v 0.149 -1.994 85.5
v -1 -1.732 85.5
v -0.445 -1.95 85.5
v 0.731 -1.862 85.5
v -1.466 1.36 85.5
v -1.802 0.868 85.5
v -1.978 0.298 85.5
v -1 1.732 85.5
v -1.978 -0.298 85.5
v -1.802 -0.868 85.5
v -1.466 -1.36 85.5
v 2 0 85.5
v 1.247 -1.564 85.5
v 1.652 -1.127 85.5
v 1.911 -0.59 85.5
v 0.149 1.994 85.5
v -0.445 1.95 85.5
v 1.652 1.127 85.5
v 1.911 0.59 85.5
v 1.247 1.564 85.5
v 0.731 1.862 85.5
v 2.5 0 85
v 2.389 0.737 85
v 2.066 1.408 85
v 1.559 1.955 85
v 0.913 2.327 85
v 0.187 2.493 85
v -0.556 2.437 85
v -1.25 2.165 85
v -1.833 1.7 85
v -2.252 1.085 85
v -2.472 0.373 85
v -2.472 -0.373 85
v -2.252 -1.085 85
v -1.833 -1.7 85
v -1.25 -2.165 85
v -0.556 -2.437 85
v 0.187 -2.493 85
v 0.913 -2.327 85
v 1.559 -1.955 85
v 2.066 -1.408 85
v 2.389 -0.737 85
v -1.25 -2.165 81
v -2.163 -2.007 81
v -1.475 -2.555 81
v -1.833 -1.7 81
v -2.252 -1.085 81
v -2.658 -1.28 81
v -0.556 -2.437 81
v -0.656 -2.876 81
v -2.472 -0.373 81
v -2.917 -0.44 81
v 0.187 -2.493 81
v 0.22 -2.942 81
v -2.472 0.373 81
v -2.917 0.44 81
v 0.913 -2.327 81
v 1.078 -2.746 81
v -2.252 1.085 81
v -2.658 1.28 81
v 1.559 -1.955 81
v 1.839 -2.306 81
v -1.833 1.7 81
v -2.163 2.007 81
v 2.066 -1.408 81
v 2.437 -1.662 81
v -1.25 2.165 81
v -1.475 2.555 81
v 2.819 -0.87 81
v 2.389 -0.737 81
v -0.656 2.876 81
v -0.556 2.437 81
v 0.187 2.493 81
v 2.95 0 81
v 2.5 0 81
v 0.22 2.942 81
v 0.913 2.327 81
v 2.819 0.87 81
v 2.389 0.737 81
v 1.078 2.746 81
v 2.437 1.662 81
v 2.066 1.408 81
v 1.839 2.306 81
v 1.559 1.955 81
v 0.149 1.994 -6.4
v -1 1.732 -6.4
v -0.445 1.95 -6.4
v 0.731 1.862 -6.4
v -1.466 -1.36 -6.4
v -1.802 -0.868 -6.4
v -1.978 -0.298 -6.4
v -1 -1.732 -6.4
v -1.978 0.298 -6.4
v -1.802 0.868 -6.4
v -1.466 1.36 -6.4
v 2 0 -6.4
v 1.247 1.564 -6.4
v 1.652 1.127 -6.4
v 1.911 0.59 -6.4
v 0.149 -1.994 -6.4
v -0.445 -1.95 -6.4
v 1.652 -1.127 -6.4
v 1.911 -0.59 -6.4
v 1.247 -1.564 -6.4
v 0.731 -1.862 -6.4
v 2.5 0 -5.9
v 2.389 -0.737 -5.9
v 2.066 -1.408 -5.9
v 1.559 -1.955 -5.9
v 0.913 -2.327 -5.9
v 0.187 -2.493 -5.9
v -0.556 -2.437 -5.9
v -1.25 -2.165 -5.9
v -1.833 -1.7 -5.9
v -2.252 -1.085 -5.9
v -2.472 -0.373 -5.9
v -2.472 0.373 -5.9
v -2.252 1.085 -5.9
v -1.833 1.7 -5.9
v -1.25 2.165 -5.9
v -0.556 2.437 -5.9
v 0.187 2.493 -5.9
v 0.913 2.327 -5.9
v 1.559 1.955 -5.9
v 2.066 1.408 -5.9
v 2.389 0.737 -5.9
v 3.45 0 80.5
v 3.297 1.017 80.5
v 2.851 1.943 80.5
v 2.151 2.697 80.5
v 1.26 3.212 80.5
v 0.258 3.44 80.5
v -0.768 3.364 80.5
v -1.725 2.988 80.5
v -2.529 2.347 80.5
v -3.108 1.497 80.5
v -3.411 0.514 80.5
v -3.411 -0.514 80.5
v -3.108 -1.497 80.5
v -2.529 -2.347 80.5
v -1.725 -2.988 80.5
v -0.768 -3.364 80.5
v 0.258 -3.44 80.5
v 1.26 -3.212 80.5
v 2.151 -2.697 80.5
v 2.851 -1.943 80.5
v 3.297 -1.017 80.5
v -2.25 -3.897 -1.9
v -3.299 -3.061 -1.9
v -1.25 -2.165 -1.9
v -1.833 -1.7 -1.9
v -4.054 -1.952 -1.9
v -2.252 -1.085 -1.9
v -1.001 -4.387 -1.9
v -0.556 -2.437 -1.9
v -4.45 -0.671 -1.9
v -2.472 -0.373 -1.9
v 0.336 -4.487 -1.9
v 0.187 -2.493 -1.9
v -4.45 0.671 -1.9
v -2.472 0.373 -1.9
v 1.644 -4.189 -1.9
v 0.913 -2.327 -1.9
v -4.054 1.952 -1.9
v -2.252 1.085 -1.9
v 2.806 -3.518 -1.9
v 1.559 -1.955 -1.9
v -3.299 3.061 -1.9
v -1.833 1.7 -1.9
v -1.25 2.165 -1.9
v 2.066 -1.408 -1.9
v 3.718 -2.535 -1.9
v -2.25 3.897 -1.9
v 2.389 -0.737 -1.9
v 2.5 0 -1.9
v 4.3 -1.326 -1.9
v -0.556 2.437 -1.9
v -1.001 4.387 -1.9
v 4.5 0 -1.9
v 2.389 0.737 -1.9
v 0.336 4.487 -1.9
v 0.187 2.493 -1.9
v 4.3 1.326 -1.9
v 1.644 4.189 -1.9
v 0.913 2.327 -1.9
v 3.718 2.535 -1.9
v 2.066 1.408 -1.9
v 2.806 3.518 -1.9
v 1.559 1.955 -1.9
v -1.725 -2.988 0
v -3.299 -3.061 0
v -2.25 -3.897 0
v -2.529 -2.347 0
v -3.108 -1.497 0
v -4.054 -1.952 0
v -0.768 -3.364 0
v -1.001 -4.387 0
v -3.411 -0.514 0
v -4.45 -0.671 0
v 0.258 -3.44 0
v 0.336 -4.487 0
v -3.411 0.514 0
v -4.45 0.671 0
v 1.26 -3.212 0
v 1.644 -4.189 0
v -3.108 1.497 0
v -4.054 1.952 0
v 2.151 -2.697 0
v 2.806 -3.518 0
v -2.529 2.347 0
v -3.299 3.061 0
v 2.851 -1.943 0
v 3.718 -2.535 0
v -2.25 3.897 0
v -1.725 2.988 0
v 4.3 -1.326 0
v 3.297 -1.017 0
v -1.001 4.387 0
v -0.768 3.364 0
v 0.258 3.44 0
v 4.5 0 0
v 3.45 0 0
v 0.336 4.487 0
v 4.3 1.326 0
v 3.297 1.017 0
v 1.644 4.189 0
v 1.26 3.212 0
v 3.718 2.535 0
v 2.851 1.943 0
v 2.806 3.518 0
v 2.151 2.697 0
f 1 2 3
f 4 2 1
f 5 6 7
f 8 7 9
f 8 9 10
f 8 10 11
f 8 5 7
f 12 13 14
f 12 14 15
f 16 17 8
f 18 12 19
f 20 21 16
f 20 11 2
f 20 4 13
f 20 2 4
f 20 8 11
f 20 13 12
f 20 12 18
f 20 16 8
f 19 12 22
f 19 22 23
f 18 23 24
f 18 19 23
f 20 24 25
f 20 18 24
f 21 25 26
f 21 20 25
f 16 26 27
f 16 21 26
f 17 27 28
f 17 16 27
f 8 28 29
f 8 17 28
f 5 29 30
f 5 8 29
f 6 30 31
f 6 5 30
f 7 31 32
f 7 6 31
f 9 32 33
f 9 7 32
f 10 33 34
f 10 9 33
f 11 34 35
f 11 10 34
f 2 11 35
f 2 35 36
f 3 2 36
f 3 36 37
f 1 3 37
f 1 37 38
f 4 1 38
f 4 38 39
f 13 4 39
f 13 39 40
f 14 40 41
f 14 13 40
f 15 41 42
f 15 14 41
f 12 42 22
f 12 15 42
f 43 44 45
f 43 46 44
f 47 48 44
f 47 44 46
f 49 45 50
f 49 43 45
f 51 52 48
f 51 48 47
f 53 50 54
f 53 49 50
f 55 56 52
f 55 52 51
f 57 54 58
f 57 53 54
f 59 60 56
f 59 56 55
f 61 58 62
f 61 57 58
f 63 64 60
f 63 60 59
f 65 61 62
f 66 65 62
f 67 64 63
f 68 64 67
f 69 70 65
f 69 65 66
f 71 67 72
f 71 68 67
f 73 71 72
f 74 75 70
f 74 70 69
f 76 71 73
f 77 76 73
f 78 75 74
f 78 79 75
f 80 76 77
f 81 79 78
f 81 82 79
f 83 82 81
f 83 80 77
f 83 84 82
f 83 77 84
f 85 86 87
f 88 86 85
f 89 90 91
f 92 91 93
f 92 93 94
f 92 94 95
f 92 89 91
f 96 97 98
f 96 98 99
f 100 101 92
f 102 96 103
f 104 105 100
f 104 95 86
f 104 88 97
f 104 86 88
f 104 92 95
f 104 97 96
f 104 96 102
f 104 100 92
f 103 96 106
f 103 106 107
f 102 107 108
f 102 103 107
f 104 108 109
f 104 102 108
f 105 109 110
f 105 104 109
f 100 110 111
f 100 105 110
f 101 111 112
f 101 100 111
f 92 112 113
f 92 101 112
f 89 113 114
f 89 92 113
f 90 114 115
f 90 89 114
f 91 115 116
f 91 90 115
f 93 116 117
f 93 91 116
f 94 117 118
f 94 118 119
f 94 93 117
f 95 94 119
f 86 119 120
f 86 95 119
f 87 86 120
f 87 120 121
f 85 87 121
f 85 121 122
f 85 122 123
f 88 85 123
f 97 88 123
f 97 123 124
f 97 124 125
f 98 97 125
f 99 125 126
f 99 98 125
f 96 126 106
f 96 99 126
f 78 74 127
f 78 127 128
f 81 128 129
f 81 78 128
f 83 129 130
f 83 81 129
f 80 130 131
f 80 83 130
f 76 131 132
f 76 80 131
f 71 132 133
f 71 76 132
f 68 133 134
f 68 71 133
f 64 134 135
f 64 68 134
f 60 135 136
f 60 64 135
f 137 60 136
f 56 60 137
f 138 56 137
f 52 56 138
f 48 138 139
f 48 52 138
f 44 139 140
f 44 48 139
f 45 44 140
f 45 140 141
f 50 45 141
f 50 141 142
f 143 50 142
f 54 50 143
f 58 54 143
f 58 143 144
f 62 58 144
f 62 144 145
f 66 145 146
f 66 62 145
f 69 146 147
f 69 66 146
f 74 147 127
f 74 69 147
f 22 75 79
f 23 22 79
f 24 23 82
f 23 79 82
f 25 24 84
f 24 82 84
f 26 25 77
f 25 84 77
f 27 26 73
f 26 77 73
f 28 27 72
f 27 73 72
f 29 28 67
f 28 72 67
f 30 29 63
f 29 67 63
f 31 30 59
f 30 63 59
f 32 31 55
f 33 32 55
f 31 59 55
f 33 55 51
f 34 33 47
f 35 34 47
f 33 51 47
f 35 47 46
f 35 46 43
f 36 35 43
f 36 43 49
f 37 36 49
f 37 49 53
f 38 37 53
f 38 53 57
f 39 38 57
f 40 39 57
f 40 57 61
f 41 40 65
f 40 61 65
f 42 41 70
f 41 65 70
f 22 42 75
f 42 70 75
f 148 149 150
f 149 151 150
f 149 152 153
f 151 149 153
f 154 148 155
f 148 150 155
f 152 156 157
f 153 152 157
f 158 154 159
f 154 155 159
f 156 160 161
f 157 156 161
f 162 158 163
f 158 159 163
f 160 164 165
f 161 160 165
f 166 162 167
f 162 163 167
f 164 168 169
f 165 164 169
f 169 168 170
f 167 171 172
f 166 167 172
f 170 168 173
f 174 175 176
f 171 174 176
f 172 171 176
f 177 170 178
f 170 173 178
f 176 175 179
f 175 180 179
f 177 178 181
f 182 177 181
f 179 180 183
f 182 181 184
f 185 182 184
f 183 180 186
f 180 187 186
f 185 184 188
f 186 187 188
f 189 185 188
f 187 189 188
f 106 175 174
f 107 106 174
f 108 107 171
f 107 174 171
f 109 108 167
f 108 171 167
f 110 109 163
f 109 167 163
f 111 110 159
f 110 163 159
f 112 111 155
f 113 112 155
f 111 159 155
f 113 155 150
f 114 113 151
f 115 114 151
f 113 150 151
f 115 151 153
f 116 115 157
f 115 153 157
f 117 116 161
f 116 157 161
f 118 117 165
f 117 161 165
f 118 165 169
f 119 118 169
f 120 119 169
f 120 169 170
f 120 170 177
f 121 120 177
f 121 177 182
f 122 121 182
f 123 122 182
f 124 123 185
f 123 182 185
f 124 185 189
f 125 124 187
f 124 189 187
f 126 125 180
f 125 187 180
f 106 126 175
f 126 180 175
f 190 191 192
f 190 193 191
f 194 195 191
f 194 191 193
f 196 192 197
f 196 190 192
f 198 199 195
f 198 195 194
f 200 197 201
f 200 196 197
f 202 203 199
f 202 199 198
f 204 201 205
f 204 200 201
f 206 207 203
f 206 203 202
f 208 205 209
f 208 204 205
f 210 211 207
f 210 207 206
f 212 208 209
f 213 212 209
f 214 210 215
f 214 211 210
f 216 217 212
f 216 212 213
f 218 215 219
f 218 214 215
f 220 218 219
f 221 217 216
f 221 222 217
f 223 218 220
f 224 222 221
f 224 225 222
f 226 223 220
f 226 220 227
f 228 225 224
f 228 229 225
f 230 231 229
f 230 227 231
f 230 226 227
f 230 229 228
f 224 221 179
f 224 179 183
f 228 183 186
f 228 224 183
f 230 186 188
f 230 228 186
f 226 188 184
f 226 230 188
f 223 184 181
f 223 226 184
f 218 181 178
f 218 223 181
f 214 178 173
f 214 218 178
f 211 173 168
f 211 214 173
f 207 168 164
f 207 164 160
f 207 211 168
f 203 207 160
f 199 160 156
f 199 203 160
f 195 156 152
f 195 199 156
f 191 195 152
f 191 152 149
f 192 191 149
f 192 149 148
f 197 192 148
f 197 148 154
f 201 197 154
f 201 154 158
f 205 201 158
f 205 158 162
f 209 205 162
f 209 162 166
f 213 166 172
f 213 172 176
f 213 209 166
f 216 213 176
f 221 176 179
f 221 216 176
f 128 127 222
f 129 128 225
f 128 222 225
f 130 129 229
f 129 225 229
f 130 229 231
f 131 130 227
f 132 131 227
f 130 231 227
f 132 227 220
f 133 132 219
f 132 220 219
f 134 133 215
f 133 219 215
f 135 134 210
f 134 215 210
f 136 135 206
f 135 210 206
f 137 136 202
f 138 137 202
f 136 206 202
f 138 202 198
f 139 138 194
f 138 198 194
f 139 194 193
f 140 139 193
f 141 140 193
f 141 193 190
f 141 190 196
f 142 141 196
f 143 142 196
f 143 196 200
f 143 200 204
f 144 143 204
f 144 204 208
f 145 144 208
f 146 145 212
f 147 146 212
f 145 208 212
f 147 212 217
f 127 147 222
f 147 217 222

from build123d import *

# Parameters (mm, degrees)
F0_R     = 3.45
F1_DEPTH = 81
F2_R     = 2.5
F3_DEPTH = 4.5
F0_R_2   = 4.5
F4_DEPTH = 1.9
F5_R     = 2.5
F6_DEPTH = 4.5
F7_SIZE  = 0.5


with BuildPart() as f1:
    # F0 (on Top) → F1 (new body)
    with BuildSketch(Plane.XY):
        Circle(F0_R)
    extrude(amount=F1_DEPTH)

    # F2 (on face) → F3 (join)
    with BuildSketch(Plane.XY.offset(81)):
        Circle(F2_R)
    extrude(amount=F3_DEPTH)

    # F0 (on Top) → F4 (join)
    with BuildSketch(Plane.XY):
        Circle(F0_R_2)
        Circle(F0_R, mode=Mode.SUBTRACT)
        Circle(F0_R)
    extrude(amount=-F4_DEPTH)

    # F5 (on face) → F6 (join)
    with BuildSketch(Plane(origin=(0, 0, -1.9), x_dir=(1, 0, 0), z_dir=(0, 0, -1))):
        Circle(F5_R)
    extrude(amount=F6_DEPTH)

    # F7
    f7_edges = [f1.edges().sort_by_distance(p)[0] for p in [
        (-2.5, 0, 85.5),
        (-3.45, 0, 81),
        (-2.5, 0, -6.4),
    ]]
    chamfer(f7_edges, length=F7_SIZE)


solid = f1.part
